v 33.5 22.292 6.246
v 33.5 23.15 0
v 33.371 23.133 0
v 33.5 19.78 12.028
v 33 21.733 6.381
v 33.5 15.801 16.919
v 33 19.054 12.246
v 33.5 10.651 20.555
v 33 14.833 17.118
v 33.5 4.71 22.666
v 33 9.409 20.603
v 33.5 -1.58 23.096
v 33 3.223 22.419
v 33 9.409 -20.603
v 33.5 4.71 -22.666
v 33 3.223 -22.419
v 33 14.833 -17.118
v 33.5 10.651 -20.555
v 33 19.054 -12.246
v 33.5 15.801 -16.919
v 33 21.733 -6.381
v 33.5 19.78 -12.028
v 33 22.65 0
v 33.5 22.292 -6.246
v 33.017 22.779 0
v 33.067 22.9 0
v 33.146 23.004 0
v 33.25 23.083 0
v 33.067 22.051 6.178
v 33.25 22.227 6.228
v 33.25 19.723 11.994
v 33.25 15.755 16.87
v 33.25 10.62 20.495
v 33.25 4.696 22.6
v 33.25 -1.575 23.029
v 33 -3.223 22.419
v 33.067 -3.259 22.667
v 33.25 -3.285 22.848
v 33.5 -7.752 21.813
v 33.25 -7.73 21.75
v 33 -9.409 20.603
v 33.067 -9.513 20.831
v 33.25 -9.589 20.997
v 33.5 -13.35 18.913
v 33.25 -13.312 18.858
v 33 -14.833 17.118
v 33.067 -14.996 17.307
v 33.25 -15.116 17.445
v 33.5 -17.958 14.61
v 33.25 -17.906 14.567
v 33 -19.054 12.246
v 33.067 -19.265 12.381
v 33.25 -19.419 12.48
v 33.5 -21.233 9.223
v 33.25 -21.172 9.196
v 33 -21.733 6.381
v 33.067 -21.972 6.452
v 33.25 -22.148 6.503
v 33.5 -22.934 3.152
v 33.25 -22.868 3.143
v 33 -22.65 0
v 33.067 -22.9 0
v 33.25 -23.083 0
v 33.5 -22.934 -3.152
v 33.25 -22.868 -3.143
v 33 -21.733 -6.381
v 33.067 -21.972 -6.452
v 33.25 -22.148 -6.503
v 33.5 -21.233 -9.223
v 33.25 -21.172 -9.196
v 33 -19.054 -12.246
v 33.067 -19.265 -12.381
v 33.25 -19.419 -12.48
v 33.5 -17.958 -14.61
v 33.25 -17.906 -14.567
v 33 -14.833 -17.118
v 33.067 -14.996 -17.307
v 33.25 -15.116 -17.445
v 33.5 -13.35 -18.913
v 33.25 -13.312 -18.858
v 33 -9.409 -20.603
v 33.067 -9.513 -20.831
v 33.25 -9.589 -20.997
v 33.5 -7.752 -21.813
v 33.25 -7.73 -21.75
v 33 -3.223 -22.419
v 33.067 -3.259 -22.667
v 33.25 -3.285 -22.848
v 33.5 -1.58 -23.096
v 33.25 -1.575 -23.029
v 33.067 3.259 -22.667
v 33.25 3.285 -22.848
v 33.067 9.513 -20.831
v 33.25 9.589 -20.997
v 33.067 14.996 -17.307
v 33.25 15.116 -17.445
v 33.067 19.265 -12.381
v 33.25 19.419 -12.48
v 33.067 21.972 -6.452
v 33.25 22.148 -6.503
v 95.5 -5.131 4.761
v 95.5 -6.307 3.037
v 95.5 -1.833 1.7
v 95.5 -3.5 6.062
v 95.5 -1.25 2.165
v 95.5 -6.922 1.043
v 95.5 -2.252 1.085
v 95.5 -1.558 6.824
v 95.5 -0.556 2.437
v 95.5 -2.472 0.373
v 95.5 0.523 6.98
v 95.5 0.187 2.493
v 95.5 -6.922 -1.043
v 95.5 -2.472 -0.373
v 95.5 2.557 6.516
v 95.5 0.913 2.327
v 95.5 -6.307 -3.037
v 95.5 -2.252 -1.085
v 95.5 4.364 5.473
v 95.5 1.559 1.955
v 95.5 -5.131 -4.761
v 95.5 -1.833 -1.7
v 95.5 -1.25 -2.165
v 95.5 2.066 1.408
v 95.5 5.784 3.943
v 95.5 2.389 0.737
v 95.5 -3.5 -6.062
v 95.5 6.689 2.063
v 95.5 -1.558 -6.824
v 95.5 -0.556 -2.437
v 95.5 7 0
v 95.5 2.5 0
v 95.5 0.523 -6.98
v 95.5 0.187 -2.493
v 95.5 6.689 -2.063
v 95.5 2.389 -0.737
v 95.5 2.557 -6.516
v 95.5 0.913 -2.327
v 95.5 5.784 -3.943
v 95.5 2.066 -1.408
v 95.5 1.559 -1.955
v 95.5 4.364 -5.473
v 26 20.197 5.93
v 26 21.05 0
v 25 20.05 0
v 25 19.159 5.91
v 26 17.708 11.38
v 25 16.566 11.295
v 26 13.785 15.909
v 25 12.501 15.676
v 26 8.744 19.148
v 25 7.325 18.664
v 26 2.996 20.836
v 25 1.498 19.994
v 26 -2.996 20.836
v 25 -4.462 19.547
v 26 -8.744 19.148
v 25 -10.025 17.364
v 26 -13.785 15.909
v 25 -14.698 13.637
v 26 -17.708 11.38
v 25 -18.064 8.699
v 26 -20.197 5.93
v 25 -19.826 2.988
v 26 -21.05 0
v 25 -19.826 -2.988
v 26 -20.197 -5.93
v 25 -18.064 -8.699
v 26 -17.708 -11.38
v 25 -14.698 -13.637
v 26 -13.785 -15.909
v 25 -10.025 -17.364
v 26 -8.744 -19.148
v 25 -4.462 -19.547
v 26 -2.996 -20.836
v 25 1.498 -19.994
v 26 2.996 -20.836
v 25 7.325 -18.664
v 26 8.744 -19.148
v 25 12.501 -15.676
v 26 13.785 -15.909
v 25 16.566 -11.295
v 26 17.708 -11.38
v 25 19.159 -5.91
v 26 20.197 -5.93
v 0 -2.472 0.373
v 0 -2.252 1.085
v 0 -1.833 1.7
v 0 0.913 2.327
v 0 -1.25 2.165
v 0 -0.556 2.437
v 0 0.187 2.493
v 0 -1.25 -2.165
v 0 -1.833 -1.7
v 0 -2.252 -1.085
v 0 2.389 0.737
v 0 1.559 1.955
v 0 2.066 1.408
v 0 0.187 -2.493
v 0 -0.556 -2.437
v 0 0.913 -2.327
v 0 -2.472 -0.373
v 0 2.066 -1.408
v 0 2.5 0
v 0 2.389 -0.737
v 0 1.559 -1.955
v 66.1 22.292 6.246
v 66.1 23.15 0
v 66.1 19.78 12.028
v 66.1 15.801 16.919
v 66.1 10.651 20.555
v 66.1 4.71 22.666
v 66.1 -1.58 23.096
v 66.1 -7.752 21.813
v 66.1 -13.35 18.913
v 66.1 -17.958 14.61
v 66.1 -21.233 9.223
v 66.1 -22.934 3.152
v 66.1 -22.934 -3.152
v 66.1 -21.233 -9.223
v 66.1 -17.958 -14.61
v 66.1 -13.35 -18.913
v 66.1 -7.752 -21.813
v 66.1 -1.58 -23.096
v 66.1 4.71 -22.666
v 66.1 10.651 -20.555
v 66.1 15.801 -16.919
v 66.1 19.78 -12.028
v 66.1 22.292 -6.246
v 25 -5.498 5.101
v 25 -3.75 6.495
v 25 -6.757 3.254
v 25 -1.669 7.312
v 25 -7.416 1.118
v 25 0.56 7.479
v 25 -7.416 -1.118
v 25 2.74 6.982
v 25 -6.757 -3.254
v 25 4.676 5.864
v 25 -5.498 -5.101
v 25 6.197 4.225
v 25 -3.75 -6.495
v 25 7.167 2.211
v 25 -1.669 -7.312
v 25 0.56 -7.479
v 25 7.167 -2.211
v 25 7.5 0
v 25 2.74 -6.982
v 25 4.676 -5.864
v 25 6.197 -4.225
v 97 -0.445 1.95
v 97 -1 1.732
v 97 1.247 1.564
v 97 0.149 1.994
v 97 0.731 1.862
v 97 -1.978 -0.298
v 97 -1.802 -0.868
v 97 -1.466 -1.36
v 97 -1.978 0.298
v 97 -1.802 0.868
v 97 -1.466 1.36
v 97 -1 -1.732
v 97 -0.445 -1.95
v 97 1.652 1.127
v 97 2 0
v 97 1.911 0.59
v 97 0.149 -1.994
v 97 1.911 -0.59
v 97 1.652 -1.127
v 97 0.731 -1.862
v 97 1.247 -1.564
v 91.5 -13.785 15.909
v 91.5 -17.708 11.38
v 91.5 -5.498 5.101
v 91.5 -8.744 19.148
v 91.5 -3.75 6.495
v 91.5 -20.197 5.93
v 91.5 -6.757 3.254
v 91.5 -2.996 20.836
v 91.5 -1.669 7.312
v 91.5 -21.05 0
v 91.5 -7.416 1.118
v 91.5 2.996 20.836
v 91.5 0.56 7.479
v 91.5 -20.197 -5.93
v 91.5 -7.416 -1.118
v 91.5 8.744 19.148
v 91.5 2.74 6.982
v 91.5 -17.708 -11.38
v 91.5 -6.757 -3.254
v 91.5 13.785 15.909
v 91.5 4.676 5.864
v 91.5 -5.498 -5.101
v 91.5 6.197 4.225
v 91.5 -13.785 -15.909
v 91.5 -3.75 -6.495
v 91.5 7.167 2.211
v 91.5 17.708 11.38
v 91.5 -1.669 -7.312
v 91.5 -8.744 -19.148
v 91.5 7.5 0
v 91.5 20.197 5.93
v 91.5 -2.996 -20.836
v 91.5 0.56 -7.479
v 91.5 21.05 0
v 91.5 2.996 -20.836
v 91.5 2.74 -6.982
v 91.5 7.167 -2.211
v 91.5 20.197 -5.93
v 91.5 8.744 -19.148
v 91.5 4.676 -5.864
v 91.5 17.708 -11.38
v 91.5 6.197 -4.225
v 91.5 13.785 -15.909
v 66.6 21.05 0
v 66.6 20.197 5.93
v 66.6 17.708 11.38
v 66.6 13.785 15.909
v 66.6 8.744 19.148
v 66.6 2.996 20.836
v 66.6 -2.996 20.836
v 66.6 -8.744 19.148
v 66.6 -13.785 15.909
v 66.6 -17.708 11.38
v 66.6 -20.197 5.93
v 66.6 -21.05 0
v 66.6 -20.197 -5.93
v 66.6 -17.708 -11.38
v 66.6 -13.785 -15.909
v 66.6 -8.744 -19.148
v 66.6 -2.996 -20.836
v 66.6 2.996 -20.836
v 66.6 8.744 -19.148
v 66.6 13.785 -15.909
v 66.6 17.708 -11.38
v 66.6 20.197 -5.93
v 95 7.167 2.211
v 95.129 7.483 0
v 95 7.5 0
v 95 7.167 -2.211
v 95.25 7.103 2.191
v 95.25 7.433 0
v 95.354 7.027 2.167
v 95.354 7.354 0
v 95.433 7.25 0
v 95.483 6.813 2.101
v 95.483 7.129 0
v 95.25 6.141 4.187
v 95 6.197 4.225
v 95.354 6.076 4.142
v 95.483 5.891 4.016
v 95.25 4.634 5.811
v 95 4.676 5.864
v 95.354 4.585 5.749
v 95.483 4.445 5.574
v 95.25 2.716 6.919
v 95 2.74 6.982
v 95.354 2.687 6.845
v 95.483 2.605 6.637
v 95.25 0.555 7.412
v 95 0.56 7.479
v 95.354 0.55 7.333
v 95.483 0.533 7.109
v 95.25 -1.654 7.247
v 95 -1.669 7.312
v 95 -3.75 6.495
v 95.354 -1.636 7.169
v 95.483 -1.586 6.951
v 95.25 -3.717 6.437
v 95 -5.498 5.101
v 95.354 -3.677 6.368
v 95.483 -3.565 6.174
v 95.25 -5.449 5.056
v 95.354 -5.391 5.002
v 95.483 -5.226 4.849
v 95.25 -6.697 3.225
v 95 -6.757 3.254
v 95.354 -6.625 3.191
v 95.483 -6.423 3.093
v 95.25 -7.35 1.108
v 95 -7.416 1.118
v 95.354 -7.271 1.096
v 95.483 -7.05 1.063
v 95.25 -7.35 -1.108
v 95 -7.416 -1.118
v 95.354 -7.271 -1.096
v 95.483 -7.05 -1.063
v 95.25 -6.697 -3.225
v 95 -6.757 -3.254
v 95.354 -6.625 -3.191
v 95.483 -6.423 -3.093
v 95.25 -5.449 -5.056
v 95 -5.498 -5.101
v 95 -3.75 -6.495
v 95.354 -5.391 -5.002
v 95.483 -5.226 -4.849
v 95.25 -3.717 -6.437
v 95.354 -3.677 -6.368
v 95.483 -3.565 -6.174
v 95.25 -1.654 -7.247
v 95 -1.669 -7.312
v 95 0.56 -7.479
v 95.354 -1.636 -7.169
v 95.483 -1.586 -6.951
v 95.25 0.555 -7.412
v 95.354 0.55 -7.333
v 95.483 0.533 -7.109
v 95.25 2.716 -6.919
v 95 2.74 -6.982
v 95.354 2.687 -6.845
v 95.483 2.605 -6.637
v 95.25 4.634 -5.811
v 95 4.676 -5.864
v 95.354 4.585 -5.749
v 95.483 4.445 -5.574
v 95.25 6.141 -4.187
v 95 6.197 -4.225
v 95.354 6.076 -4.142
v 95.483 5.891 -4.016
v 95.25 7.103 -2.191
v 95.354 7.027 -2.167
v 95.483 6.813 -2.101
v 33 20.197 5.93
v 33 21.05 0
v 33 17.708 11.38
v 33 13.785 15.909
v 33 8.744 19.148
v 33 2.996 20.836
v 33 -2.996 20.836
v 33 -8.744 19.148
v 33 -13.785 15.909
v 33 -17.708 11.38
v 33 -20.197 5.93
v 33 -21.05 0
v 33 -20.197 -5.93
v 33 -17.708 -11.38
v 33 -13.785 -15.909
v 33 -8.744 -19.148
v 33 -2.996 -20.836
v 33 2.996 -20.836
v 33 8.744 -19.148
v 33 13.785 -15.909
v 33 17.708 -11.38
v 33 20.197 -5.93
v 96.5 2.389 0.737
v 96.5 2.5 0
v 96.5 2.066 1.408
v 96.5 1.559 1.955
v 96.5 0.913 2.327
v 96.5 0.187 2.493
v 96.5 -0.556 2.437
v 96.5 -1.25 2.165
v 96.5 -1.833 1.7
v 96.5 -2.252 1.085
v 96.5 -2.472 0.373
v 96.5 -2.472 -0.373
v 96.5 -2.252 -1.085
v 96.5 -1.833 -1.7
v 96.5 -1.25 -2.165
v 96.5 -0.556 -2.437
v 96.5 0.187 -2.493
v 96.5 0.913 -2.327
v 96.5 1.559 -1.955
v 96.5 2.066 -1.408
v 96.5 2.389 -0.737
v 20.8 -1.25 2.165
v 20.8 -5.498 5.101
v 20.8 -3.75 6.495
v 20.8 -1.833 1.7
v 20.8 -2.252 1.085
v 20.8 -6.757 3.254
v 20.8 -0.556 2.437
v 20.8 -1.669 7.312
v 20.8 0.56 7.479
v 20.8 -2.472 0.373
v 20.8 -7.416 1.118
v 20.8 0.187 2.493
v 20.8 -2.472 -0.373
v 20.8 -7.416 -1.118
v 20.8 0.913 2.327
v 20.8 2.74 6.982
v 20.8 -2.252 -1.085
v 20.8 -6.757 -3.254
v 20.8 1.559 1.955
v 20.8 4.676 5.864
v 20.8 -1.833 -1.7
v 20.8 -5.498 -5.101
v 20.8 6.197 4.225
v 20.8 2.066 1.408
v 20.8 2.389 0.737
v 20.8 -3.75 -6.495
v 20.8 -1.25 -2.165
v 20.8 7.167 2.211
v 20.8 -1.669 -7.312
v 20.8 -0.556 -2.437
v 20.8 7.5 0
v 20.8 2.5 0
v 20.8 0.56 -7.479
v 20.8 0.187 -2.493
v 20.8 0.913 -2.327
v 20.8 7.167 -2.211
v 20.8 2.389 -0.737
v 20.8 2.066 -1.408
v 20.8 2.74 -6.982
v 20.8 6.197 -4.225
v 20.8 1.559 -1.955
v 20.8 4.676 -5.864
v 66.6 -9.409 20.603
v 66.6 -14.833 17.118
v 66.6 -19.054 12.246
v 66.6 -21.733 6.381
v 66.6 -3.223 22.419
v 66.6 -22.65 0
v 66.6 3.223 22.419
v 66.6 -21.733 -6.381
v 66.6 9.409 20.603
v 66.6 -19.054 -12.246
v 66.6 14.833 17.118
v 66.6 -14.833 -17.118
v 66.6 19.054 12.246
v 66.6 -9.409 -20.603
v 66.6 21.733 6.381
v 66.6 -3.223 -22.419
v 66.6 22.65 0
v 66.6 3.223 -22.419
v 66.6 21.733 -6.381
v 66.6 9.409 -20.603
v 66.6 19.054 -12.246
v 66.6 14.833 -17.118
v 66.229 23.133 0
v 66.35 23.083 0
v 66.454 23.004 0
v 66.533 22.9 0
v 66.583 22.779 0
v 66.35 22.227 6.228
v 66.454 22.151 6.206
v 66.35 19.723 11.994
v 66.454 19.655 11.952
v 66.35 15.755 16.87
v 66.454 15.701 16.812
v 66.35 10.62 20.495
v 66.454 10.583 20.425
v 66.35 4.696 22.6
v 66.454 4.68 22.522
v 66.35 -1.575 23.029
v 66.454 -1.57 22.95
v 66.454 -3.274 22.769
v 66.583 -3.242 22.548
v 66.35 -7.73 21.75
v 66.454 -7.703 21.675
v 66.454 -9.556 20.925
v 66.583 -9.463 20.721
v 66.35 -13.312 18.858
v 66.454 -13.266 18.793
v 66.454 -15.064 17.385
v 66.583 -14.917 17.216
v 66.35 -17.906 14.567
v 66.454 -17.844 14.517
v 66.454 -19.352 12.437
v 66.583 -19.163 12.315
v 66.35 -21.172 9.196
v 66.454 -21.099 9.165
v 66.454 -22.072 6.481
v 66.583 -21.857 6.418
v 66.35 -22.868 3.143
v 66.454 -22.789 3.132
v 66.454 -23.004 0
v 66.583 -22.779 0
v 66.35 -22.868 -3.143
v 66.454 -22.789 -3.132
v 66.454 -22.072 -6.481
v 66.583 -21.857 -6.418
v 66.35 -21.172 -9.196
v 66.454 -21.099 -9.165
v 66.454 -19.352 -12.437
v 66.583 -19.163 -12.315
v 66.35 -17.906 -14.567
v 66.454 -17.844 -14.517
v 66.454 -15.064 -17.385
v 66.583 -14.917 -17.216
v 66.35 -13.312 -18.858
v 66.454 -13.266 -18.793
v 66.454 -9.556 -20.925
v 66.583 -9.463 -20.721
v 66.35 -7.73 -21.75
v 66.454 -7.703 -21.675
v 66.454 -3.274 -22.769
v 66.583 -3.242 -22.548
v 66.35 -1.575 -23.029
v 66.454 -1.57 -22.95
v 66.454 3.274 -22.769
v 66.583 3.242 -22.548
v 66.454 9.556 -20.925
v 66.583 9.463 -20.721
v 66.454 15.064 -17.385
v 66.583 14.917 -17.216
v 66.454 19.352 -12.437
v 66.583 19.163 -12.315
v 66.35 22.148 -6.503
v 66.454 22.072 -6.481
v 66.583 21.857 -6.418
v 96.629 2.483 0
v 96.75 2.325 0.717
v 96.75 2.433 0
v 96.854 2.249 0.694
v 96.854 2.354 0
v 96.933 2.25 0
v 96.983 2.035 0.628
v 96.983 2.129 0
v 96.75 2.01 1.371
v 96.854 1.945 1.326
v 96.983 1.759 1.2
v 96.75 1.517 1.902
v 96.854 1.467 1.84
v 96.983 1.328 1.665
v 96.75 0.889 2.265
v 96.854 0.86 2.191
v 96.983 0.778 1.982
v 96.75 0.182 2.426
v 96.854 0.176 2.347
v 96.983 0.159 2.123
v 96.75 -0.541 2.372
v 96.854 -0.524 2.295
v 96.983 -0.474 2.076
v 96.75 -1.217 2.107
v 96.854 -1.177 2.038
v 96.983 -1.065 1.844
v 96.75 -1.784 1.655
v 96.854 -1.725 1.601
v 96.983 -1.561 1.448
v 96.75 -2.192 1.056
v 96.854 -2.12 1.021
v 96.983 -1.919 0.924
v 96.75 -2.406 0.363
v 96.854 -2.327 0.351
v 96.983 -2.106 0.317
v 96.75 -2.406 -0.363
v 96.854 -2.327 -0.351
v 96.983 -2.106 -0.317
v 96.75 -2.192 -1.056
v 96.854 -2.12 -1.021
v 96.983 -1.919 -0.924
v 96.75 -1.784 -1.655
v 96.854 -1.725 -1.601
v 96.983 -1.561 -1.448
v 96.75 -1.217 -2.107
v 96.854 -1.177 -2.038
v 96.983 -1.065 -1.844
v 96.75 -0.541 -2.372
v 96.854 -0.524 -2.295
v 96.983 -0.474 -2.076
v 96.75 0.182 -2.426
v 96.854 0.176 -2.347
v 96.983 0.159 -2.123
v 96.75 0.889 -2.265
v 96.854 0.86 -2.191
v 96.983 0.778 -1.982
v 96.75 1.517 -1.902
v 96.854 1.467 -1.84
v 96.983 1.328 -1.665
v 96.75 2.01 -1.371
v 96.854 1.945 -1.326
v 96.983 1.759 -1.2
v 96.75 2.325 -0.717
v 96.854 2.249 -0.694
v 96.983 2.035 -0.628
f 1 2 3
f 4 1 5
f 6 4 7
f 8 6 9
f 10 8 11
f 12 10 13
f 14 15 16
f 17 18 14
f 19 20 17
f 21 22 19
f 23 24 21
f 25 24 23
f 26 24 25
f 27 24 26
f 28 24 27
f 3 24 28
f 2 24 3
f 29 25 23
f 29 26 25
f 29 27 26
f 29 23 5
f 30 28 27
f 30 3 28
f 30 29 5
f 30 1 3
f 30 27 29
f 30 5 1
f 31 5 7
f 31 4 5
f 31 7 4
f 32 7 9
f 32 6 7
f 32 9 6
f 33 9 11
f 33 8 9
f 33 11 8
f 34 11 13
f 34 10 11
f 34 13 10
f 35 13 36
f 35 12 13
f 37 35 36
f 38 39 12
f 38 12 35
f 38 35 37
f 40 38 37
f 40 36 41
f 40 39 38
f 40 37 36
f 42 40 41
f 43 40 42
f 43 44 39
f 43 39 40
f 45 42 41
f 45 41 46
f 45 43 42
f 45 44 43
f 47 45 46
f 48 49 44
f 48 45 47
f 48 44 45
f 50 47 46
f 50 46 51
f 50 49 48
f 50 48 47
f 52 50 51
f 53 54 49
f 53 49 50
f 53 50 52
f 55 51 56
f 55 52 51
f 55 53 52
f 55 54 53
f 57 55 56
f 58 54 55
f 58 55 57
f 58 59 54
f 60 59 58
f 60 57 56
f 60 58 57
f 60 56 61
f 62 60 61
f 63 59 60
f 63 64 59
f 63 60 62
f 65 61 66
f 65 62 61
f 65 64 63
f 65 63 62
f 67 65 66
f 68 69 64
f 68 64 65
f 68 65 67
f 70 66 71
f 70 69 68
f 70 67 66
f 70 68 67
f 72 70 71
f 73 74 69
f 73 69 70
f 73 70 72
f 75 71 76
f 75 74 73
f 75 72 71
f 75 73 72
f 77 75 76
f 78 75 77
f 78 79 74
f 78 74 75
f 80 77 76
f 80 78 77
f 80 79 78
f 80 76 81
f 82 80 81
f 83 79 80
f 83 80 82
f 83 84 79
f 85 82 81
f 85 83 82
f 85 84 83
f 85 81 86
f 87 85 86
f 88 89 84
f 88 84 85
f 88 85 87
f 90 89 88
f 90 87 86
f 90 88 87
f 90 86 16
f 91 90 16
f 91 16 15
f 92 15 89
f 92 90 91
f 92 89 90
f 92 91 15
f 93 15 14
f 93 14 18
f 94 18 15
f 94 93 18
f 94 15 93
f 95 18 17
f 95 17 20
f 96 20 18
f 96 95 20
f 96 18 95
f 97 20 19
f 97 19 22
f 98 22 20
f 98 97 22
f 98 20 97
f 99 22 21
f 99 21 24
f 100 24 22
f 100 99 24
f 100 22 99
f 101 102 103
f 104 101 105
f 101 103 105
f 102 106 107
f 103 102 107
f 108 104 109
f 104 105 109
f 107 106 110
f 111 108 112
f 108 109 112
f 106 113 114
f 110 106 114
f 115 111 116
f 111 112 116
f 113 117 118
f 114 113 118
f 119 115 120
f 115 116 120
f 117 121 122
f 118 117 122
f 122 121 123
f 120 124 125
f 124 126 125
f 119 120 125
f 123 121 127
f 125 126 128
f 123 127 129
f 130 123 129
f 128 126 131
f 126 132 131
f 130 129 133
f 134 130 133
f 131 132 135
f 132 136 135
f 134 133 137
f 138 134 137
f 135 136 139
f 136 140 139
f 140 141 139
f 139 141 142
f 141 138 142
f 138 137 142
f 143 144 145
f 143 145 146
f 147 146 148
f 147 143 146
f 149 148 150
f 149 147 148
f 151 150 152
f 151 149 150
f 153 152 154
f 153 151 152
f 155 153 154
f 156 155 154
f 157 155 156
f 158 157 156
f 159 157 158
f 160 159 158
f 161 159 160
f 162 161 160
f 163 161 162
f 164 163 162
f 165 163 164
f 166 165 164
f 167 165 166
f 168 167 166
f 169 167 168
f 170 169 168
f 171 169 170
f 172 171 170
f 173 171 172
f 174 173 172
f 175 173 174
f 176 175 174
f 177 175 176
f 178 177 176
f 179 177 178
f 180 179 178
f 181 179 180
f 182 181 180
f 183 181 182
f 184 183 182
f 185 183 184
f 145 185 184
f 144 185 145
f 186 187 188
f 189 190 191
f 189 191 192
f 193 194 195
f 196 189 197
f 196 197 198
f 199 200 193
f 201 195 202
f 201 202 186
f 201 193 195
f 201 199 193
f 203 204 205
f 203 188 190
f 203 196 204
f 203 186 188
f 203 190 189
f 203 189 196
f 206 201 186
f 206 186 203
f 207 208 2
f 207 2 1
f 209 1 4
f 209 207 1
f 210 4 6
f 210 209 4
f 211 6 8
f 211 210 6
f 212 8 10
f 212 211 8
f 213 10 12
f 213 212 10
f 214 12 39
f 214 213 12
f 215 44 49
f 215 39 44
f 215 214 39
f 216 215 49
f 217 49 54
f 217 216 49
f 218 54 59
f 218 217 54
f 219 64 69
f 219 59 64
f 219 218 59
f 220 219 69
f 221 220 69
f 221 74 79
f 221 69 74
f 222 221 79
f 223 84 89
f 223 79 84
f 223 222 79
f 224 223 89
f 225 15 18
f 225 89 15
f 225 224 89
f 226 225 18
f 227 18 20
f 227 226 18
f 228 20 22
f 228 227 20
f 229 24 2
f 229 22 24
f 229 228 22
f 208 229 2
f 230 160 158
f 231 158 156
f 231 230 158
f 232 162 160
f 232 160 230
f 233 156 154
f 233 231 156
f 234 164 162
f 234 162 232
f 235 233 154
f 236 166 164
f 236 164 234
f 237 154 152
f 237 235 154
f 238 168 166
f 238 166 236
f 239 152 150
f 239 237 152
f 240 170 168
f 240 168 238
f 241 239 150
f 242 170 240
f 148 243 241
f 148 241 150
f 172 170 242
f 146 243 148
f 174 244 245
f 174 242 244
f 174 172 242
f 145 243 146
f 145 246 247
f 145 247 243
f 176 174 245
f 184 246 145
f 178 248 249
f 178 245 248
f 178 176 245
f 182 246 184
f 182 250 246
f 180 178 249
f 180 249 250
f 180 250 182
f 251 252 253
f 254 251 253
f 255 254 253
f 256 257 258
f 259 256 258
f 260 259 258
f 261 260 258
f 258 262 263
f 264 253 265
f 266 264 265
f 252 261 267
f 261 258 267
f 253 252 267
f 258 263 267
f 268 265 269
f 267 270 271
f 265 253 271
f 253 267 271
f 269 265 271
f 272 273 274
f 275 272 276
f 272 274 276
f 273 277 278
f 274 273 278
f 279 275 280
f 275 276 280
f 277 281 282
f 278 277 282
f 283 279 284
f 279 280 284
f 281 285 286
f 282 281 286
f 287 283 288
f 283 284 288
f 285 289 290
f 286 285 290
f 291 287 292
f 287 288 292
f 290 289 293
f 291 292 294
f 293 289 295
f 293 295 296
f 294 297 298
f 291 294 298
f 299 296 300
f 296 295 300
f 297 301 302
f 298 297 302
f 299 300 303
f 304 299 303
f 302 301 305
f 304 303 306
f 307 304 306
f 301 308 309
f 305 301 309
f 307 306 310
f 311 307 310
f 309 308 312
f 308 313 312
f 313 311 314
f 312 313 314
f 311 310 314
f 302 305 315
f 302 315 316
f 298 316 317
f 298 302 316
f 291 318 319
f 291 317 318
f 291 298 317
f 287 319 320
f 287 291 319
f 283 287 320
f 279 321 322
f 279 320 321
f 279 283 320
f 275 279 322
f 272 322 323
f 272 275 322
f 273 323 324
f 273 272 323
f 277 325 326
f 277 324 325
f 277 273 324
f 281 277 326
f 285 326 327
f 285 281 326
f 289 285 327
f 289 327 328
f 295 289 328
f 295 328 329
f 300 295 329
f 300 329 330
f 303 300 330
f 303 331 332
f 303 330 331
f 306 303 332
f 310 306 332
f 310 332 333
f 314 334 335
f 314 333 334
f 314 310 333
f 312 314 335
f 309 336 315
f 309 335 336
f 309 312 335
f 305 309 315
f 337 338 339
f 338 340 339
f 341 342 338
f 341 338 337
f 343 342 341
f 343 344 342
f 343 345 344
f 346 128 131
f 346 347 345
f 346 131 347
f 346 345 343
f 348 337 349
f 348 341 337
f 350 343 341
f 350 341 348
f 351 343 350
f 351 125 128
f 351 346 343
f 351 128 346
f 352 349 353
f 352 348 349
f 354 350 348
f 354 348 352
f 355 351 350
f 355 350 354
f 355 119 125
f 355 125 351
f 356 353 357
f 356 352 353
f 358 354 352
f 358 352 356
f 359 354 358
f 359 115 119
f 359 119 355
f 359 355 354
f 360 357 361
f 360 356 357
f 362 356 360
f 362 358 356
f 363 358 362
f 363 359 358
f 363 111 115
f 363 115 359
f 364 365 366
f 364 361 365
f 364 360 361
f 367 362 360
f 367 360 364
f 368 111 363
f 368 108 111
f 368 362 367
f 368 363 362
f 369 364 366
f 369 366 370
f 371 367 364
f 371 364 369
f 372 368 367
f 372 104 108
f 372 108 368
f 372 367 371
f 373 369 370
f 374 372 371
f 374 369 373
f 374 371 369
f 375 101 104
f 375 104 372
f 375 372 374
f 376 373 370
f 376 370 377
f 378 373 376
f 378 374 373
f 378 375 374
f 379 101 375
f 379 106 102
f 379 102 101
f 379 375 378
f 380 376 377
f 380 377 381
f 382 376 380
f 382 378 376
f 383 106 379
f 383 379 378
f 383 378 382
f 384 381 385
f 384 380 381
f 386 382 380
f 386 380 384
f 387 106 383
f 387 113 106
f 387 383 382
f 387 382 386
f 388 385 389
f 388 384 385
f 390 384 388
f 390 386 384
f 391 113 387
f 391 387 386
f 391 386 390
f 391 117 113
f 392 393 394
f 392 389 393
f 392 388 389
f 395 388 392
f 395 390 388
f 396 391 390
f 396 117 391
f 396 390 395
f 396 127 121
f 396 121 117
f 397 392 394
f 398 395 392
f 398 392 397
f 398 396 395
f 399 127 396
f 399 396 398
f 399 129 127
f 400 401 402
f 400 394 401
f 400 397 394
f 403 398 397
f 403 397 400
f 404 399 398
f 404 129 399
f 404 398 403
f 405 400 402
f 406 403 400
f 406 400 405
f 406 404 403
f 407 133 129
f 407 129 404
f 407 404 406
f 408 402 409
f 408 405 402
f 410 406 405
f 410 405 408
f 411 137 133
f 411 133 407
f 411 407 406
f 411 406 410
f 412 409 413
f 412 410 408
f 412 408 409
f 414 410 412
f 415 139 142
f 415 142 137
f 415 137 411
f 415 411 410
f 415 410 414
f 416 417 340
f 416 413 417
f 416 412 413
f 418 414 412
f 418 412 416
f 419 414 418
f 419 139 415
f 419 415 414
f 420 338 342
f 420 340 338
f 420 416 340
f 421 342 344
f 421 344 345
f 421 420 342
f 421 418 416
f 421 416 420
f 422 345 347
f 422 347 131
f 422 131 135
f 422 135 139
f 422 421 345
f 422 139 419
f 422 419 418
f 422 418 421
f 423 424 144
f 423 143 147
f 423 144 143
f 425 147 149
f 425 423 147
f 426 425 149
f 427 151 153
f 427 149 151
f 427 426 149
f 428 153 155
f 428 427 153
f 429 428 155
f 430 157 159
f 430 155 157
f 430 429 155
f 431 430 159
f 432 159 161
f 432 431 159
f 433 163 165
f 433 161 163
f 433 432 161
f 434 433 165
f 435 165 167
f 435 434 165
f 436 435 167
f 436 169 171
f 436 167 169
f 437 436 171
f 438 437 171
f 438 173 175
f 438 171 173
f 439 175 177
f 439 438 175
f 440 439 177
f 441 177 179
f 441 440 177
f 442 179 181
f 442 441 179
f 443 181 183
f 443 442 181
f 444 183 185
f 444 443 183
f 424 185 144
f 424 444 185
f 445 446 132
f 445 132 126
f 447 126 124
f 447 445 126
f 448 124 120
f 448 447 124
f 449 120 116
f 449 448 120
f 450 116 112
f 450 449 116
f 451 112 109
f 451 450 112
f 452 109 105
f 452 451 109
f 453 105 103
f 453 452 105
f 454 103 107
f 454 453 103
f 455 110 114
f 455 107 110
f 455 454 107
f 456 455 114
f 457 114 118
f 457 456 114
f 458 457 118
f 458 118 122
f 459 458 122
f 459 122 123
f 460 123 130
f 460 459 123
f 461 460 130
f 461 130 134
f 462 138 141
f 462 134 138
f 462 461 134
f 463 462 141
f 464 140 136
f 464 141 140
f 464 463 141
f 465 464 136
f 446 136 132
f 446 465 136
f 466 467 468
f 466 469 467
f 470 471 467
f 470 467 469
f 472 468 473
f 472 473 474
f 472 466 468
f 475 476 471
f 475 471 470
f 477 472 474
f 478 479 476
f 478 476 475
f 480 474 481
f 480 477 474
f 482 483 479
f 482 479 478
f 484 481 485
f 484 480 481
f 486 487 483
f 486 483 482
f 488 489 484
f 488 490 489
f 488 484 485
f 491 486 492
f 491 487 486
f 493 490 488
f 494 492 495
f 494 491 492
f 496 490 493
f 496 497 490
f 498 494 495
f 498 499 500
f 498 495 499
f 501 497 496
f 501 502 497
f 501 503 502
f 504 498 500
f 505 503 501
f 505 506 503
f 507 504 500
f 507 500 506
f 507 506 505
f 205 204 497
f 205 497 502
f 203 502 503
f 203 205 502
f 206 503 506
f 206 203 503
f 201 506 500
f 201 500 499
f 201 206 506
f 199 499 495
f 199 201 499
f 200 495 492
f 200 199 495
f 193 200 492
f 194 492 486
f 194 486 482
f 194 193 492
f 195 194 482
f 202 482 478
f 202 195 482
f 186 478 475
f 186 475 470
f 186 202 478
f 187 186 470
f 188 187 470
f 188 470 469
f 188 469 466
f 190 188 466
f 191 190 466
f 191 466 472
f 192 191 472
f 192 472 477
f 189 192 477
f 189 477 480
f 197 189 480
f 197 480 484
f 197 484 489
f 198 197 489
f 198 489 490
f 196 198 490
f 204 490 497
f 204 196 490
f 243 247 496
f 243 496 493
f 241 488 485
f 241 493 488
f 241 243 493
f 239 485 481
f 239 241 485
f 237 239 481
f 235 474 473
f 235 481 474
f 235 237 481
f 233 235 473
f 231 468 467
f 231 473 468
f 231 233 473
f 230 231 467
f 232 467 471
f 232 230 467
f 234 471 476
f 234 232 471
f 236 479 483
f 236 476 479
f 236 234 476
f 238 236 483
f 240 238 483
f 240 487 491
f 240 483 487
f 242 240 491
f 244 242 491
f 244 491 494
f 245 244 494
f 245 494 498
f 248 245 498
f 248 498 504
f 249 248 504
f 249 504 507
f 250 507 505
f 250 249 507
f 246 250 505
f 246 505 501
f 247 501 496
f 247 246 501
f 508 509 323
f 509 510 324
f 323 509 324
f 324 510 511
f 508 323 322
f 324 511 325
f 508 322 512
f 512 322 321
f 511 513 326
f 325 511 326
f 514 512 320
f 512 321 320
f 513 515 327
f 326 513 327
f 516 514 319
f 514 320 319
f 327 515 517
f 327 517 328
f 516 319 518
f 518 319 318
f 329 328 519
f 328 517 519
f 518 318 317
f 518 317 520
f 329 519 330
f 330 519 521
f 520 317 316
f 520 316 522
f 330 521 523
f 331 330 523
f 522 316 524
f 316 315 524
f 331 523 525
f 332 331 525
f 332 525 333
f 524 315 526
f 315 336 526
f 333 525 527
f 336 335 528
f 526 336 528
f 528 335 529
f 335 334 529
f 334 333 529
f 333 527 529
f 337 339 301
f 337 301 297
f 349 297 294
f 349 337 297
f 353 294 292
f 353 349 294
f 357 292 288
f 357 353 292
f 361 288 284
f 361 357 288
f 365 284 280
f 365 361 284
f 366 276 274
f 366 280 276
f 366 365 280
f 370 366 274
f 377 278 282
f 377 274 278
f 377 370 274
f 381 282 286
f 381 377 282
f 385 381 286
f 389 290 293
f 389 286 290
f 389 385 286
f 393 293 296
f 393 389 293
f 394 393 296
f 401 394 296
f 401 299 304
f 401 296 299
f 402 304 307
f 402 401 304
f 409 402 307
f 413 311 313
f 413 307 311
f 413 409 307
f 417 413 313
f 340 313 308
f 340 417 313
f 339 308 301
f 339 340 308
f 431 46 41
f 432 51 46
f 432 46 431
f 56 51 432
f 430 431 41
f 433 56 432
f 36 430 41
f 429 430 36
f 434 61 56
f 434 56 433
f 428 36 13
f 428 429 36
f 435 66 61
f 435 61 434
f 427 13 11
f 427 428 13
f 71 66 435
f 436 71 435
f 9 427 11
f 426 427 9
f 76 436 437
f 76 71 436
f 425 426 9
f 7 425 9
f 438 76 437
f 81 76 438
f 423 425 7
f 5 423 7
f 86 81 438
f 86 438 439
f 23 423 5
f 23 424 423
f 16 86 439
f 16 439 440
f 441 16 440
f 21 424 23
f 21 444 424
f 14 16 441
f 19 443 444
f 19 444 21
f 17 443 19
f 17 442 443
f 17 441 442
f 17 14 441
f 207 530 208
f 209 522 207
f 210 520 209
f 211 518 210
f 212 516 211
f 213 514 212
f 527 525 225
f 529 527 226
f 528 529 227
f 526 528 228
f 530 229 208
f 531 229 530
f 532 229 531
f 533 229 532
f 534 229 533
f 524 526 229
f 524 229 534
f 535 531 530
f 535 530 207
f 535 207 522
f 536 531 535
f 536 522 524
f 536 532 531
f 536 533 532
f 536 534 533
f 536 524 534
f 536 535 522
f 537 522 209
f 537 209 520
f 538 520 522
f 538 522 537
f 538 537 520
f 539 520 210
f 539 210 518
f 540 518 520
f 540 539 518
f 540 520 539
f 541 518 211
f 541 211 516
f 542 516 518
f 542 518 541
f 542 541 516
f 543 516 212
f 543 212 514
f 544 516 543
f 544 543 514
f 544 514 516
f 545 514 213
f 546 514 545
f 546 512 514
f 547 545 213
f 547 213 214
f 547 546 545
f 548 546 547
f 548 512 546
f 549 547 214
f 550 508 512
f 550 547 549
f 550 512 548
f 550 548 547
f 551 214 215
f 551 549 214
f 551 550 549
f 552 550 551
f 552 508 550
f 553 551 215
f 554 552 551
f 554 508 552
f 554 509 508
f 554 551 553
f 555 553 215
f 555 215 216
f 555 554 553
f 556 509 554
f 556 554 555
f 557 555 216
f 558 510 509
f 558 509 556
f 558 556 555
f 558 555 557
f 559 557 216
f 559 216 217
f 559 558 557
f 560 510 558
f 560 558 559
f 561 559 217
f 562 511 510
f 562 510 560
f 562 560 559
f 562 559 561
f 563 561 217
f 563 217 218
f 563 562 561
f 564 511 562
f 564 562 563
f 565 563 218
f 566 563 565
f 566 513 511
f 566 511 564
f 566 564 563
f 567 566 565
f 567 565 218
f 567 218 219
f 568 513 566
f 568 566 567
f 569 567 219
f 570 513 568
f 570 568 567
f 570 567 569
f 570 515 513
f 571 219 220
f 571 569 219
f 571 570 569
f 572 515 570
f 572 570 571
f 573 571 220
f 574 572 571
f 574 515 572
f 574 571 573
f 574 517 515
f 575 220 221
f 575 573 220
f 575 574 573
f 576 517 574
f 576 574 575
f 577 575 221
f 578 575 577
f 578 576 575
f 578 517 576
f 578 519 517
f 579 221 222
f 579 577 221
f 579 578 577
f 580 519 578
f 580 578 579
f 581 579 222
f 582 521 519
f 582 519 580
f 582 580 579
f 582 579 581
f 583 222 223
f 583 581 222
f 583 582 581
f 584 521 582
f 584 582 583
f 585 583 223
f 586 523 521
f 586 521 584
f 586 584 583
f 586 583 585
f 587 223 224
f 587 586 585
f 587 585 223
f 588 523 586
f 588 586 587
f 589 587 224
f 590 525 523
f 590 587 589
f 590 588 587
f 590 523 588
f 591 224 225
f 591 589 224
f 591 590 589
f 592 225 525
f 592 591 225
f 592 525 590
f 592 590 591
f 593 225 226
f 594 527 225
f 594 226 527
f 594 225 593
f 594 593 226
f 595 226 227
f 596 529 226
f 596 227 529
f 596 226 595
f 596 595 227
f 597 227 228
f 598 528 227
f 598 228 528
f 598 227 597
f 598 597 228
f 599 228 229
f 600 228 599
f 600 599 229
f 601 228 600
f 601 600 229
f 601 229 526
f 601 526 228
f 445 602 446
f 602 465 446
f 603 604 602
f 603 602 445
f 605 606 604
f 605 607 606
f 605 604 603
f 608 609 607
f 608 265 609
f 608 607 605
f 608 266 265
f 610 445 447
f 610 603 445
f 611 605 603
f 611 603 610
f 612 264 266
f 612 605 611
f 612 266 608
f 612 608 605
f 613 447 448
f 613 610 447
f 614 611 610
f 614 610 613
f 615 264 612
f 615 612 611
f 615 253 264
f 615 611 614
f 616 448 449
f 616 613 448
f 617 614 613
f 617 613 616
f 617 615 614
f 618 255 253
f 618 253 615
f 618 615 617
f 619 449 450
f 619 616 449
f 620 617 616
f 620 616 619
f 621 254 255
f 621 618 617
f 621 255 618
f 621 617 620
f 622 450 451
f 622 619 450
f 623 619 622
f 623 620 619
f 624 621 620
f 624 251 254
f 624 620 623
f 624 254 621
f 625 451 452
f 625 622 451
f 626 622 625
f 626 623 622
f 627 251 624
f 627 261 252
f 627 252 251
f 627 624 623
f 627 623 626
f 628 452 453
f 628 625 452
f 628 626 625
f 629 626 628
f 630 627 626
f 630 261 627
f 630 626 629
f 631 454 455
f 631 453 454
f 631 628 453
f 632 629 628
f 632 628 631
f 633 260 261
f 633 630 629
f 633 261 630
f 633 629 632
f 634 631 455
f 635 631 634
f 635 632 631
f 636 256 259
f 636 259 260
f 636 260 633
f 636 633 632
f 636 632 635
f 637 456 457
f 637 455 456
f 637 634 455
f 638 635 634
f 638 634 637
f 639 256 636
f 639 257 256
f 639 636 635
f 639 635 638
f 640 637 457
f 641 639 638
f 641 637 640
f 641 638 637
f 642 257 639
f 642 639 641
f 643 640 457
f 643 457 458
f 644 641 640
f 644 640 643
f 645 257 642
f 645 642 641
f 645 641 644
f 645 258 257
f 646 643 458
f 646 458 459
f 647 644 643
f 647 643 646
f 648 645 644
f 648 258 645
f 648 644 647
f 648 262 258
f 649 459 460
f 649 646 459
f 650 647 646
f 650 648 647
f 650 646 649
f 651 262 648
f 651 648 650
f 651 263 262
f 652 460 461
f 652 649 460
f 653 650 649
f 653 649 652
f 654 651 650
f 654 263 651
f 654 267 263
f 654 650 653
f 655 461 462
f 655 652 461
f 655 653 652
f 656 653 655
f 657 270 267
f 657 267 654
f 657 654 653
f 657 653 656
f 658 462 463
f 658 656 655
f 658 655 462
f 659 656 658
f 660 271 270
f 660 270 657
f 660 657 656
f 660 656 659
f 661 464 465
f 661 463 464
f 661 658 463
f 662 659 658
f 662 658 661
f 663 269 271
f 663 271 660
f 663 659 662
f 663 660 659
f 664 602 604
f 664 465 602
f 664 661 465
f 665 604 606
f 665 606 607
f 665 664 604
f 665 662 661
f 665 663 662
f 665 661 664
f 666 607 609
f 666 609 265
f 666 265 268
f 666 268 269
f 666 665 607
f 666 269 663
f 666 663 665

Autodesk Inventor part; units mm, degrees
ref_plane "YZ Plane" through (0, 0, 0) normal (1, 0, 0) x (0, 1, 0)
ref_plane "XZ Plane" through (0, 0, 0) normal (0, 1, 0) x (-1, 0, 0)
ref_plane "XY Plane" through (0, 0, 0) normal (0, 0, 1) x (1, 0, 0)
sketch "スケッチ1" plane through (0, 0, 0) normal (0, 0, 1) x (1, 0, 0)
  line L0 (20.8, 7.5) -> (25, 7.5)
  line L1 (25, 7.5) -> (25, 21.05)
  line L2 (25, 21.05) -> (33, 21.05)
  line L3 (33, 21.05) -> (33, 23.15)
  line L4 (33, 23.15) -> (66.6, 23.15)
  line L5 (66.6, 23.15) -> (66.6, 21.05)
  line L6 (66.6, 21.05) -> (91.5, 21.05)
  line L7 (91.5, 21.05) -> (91.5, 7.5)
  line L8 (91.5, 7.5) -> (95.5, 7.5)
  line L9 (95.5, 7.5) -> (95.5, 2.5)
  line L10 (95.5, 2.5) -> (97, 2.5)
  line L11 (97, 2.5) -> (97, 0)
  line L12 (97, 0) -> (0, 0)
  line L13 (20.8, 7.5) -> (20.8, 2.5)
  line L14 (20.8, 2.5) -> (0, 2.5)
  line L15 (0, 2.5) -> (0, 0)
  dimension "d1" = 4.2
  dimension "d2" = 21.05
  dimension "d3" = 23.15
  dimension "d4" = 8
  dimension "d5" = 33.6
  dimension "d6" = 66.5
  dimension "d7" = 7.5
  dimension "d8" = 4
  dimension "d9" = 7.5
  dimension "d10" = 97
  dimension "d11" = 25
  dimension "d12" = 2.5
  dimension "d13" = 2.5
revolve "回転1" add sketch "スケッチ1" angle 360 about axis through (97, 0, 0) along (-1, 0, 0)
chamfer "面取り1" distance 1 angle 45 1 edges at (25, -21.05, 0)
fillet "フィレット1" radius 0.5 4 edges at (33, -23.15, 0) (66.6, -23.15, 0) (95.5, -7.5, 0) (97, -2.5, 0)
properties part number "RS-775"
